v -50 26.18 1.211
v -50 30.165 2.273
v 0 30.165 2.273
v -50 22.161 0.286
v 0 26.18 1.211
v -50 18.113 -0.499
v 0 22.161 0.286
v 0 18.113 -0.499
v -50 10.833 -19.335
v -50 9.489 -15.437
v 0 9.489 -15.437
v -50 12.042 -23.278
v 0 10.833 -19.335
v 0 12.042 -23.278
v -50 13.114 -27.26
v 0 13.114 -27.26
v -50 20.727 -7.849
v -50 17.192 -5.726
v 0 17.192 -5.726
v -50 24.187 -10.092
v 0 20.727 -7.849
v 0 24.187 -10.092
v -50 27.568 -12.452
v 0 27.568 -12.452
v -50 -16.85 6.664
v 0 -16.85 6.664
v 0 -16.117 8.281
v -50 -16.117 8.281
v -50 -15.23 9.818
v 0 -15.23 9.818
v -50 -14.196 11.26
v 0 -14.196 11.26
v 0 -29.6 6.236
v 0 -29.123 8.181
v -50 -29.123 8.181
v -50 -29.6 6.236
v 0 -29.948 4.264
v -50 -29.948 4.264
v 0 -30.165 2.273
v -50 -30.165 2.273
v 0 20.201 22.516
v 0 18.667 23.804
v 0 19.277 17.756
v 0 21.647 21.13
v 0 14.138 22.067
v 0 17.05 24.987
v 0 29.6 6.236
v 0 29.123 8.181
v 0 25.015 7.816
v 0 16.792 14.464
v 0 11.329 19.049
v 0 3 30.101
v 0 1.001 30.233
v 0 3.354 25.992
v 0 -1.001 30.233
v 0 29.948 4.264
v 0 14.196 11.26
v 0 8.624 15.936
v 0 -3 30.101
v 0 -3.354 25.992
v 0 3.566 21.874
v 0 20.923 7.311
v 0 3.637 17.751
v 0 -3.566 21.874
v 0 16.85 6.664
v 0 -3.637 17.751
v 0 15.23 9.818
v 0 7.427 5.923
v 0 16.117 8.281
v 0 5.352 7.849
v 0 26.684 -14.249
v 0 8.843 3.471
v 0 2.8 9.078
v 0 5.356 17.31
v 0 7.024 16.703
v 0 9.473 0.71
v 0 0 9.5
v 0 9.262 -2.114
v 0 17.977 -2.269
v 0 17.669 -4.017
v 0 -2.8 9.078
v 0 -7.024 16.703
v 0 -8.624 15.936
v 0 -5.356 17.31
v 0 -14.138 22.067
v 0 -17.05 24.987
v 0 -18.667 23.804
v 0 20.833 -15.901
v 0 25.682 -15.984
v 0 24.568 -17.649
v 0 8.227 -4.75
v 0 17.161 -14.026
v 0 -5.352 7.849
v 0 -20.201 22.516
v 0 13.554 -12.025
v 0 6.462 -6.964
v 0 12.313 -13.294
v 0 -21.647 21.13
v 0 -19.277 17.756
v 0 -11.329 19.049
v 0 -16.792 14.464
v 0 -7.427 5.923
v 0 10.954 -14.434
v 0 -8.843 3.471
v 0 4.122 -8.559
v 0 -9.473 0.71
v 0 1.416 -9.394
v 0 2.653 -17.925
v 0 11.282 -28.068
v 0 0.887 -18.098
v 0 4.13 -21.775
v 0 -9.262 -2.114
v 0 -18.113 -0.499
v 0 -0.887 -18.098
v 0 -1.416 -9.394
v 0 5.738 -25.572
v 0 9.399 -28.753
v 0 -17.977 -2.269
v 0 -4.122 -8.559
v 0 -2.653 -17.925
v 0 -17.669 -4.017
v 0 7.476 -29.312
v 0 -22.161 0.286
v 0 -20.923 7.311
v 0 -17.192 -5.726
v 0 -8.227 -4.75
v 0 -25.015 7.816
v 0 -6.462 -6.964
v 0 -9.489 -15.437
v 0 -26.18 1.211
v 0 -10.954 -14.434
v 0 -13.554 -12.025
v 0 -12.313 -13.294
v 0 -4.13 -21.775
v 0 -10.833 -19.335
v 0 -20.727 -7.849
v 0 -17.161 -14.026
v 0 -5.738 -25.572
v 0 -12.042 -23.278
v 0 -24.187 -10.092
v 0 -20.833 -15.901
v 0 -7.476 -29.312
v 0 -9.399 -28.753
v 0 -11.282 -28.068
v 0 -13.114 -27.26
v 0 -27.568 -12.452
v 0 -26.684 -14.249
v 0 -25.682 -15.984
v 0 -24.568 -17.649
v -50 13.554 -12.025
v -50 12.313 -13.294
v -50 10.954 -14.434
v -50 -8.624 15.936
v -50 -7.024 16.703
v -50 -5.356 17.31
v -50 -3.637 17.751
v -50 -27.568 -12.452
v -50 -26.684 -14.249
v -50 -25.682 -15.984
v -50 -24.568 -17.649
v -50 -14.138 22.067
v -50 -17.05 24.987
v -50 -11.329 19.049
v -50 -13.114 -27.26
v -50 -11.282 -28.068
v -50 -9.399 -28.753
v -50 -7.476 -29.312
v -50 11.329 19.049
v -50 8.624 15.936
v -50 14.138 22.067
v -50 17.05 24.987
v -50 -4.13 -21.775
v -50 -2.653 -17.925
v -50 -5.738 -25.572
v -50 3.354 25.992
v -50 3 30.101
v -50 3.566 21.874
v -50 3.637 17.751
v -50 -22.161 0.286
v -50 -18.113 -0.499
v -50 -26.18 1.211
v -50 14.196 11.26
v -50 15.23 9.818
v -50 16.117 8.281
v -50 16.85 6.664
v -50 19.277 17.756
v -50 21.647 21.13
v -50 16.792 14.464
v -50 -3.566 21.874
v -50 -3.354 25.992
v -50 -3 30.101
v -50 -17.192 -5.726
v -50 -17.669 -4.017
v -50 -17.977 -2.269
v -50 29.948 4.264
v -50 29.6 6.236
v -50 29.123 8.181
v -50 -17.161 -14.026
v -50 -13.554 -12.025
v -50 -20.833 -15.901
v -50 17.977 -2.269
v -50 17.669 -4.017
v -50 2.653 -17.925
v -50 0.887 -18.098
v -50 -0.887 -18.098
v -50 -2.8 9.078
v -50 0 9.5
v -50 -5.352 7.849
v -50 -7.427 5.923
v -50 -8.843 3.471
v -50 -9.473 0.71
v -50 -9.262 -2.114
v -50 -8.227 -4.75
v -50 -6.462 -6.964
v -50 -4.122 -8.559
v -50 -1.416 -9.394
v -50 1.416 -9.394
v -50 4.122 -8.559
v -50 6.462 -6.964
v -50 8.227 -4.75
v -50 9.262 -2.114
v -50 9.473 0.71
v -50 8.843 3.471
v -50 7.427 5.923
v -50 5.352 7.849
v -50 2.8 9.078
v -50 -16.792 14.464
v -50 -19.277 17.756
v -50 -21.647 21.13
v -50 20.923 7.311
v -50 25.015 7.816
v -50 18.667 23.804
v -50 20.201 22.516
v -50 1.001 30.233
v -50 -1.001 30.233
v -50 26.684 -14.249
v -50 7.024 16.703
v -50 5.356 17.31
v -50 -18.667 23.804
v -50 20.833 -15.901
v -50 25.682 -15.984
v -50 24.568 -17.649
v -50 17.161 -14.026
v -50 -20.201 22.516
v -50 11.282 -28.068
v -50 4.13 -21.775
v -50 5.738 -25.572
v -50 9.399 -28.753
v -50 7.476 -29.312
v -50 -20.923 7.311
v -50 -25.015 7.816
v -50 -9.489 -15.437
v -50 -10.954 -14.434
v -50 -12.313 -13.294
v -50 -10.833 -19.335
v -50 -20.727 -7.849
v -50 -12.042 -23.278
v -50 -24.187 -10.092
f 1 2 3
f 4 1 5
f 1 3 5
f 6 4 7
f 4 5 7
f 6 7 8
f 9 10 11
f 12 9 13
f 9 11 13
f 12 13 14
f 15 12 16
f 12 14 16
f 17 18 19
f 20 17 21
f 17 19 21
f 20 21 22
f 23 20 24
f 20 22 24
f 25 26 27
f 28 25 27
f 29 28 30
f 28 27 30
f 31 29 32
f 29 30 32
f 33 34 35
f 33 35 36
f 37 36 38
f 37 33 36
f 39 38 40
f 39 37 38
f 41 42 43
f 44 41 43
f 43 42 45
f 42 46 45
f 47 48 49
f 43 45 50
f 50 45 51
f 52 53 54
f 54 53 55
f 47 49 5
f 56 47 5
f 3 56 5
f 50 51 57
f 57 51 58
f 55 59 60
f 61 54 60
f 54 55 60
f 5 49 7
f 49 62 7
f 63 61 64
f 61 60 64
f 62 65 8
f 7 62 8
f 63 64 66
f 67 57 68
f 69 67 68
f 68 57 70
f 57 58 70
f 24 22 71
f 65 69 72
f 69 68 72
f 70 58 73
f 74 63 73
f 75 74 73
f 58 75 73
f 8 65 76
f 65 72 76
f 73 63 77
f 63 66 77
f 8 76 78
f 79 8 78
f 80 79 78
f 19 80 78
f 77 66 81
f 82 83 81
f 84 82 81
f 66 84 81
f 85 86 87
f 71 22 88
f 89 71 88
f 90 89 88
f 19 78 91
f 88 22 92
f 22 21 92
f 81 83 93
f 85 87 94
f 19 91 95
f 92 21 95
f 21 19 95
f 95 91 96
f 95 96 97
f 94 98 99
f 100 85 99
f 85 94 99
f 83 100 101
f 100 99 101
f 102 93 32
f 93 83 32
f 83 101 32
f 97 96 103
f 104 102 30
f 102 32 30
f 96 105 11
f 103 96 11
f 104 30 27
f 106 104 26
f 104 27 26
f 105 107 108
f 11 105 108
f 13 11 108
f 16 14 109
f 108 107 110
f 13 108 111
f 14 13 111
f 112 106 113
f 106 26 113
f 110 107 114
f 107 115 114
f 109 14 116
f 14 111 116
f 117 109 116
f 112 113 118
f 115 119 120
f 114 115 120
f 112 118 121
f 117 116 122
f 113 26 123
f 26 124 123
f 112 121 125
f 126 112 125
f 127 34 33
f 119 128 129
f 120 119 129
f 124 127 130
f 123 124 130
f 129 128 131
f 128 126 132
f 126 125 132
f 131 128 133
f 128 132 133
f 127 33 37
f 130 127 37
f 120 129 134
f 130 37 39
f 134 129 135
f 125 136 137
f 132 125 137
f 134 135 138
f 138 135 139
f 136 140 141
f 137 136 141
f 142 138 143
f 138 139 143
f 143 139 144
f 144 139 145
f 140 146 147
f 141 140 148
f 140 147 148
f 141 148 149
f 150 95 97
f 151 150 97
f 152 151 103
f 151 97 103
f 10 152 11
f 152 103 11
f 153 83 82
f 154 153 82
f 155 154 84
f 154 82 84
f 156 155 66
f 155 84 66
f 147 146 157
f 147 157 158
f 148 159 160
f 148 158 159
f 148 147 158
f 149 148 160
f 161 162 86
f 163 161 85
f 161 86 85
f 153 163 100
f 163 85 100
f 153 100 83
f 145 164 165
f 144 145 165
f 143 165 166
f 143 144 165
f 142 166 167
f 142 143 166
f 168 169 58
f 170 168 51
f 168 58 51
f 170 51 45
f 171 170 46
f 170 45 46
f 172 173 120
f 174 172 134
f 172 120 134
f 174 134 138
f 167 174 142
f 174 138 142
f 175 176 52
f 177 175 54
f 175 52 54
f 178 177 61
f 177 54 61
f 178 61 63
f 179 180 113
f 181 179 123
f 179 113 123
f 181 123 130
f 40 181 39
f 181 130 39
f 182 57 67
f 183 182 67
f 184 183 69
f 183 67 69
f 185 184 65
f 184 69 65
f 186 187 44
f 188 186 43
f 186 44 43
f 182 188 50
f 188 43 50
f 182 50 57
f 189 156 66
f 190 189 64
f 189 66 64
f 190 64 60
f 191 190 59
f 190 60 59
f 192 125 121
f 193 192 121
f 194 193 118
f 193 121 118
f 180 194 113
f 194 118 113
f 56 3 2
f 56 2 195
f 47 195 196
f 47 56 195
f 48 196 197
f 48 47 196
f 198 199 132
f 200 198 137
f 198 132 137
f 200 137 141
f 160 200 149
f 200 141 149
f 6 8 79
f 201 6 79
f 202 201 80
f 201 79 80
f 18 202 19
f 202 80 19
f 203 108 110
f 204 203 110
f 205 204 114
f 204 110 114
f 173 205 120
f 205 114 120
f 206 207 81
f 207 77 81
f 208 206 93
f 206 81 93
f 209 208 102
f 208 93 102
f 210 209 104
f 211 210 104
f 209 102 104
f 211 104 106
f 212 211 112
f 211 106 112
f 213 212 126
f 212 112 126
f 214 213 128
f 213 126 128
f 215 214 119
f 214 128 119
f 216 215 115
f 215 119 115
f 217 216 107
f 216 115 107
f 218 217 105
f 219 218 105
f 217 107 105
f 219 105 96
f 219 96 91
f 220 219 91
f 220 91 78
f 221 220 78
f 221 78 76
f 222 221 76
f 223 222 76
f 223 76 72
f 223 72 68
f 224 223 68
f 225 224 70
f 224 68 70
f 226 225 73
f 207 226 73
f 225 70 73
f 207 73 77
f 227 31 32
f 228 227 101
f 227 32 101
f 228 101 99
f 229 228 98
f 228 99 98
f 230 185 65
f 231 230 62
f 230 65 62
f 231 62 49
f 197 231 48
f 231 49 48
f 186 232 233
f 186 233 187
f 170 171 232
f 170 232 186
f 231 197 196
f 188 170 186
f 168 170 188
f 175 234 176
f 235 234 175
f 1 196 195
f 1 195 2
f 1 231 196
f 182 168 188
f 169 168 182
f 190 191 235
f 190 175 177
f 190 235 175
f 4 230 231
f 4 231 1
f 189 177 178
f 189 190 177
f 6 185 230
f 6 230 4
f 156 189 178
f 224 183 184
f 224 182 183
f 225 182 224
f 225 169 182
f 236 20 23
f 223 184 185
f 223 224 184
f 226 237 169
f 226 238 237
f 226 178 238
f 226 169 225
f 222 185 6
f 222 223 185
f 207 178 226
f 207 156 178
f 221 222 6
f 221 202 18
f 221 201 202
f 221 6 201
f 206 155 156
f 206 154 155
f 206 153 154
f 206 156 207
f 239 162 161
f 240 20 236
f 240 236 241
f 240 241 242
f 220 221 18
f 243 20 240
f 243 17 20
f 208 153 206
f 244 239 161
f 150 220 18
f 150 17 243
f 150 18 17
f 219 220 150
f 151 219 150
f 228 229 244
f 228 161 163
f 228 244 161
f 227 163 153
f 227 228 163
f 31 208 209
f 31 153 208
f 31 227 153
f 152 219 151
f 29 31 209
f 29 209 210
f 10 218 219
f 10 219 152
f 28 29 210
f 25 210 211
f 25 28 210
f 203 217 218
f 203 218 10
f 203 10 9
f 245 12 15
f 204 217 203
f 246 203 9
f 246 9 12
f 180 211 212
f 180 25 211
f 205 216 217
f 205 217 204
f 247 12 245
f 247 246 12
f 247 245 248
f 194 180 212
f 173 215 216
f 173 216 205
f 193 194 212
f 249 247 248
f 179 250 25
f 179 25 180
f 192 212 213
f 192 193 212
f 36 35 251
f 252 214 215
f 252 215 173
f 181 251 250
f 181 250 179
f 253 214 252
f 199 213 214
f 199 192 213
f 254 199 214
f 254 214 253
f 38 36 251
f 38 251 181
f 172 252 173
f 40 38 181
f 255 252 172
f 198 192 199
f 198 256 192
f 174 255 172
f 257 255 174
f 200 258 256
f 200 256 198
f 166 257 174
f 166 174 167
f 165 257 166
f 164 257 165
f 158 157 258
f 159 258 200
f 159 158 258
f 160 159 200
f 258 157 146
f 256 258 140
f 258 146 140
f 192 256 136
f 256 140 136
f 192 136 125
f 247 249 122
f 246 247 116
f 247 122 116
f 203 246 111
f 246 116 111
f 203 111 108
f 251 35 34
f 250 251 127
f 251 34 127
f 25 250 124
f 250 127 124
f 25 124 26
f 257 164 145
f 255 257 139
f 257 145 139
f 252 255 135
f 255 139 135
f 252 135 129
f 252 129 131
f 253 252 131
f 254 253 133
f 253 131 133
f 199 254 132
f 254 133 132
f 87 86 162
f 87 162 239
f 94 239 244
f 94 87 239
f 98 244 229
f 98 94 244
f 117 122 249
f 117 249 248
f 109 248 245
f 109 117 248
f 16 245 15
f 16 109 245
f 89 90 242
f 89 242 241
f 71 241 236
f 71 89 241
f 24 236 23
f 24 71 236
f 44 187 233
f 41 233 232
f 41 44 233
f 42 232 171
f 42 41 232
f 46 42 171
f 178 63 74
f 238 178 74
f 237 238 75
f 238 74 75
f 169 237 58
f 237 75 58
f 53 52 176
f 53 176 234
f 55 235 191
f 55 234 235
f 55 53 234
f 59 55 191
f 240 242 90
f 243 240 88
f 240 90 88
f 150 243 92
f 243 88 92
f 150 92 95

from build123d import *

# Parameters (mm, degrees)
F0_W     = 50
F0_H     = 20.75
F3_DEPTH = 50.001
F4_COUNT = 9


with BuildPart() as f1:
    # F0 (on Front) → F1 (revolve)
    with BuildSketch(Plane.XZ):
        with Locations((-25, 19.875)):
            Rectangle(F0_W, F0_H)
    revolve(axis=Axis((-20.0732499361, 0, 0), (1, 0, 0)))

    # F2 (on face) → F3 (cut, through all)
    with BuildSketch(Plane.YZ):
        with BuildLine():
            ThreePointArc((-8.6240252272, 15.9361409658), (-6.1974049971, 17.0272302886), (-3.6371673564, 17.7512087932))
            ThreePointArc((-3.6371673564, 17.7512087932), (-3.4777696522, 23.9342534629), (-3, 30.1008720804))
            ThreePointArc((-3, 30.1008720804), (-10.3461093356, 28.4257017788), (-17.0503342847, 24.9869686193))
            ThreePointArc((-17.0503342847, 24.9869686193), (-12.7205154565, 20.5701691072), (-8.6240252272, 15.9361409658))
        make_face()
    f3 = extrude(amount=-F3_DEPTH, mode=Mode.SUBTRACT)

    # F4: F3 ×9 about axis
    f4_axis = Axis((-20.0732499361, 0, 0), (1, 0, 0))
    for i in range(1, F4_COUNT):
        add(f3.rotate(f4_axis, i * 360 / F4_COUNT), mode=Mode.SUBTRACT)


solid = f1.part
